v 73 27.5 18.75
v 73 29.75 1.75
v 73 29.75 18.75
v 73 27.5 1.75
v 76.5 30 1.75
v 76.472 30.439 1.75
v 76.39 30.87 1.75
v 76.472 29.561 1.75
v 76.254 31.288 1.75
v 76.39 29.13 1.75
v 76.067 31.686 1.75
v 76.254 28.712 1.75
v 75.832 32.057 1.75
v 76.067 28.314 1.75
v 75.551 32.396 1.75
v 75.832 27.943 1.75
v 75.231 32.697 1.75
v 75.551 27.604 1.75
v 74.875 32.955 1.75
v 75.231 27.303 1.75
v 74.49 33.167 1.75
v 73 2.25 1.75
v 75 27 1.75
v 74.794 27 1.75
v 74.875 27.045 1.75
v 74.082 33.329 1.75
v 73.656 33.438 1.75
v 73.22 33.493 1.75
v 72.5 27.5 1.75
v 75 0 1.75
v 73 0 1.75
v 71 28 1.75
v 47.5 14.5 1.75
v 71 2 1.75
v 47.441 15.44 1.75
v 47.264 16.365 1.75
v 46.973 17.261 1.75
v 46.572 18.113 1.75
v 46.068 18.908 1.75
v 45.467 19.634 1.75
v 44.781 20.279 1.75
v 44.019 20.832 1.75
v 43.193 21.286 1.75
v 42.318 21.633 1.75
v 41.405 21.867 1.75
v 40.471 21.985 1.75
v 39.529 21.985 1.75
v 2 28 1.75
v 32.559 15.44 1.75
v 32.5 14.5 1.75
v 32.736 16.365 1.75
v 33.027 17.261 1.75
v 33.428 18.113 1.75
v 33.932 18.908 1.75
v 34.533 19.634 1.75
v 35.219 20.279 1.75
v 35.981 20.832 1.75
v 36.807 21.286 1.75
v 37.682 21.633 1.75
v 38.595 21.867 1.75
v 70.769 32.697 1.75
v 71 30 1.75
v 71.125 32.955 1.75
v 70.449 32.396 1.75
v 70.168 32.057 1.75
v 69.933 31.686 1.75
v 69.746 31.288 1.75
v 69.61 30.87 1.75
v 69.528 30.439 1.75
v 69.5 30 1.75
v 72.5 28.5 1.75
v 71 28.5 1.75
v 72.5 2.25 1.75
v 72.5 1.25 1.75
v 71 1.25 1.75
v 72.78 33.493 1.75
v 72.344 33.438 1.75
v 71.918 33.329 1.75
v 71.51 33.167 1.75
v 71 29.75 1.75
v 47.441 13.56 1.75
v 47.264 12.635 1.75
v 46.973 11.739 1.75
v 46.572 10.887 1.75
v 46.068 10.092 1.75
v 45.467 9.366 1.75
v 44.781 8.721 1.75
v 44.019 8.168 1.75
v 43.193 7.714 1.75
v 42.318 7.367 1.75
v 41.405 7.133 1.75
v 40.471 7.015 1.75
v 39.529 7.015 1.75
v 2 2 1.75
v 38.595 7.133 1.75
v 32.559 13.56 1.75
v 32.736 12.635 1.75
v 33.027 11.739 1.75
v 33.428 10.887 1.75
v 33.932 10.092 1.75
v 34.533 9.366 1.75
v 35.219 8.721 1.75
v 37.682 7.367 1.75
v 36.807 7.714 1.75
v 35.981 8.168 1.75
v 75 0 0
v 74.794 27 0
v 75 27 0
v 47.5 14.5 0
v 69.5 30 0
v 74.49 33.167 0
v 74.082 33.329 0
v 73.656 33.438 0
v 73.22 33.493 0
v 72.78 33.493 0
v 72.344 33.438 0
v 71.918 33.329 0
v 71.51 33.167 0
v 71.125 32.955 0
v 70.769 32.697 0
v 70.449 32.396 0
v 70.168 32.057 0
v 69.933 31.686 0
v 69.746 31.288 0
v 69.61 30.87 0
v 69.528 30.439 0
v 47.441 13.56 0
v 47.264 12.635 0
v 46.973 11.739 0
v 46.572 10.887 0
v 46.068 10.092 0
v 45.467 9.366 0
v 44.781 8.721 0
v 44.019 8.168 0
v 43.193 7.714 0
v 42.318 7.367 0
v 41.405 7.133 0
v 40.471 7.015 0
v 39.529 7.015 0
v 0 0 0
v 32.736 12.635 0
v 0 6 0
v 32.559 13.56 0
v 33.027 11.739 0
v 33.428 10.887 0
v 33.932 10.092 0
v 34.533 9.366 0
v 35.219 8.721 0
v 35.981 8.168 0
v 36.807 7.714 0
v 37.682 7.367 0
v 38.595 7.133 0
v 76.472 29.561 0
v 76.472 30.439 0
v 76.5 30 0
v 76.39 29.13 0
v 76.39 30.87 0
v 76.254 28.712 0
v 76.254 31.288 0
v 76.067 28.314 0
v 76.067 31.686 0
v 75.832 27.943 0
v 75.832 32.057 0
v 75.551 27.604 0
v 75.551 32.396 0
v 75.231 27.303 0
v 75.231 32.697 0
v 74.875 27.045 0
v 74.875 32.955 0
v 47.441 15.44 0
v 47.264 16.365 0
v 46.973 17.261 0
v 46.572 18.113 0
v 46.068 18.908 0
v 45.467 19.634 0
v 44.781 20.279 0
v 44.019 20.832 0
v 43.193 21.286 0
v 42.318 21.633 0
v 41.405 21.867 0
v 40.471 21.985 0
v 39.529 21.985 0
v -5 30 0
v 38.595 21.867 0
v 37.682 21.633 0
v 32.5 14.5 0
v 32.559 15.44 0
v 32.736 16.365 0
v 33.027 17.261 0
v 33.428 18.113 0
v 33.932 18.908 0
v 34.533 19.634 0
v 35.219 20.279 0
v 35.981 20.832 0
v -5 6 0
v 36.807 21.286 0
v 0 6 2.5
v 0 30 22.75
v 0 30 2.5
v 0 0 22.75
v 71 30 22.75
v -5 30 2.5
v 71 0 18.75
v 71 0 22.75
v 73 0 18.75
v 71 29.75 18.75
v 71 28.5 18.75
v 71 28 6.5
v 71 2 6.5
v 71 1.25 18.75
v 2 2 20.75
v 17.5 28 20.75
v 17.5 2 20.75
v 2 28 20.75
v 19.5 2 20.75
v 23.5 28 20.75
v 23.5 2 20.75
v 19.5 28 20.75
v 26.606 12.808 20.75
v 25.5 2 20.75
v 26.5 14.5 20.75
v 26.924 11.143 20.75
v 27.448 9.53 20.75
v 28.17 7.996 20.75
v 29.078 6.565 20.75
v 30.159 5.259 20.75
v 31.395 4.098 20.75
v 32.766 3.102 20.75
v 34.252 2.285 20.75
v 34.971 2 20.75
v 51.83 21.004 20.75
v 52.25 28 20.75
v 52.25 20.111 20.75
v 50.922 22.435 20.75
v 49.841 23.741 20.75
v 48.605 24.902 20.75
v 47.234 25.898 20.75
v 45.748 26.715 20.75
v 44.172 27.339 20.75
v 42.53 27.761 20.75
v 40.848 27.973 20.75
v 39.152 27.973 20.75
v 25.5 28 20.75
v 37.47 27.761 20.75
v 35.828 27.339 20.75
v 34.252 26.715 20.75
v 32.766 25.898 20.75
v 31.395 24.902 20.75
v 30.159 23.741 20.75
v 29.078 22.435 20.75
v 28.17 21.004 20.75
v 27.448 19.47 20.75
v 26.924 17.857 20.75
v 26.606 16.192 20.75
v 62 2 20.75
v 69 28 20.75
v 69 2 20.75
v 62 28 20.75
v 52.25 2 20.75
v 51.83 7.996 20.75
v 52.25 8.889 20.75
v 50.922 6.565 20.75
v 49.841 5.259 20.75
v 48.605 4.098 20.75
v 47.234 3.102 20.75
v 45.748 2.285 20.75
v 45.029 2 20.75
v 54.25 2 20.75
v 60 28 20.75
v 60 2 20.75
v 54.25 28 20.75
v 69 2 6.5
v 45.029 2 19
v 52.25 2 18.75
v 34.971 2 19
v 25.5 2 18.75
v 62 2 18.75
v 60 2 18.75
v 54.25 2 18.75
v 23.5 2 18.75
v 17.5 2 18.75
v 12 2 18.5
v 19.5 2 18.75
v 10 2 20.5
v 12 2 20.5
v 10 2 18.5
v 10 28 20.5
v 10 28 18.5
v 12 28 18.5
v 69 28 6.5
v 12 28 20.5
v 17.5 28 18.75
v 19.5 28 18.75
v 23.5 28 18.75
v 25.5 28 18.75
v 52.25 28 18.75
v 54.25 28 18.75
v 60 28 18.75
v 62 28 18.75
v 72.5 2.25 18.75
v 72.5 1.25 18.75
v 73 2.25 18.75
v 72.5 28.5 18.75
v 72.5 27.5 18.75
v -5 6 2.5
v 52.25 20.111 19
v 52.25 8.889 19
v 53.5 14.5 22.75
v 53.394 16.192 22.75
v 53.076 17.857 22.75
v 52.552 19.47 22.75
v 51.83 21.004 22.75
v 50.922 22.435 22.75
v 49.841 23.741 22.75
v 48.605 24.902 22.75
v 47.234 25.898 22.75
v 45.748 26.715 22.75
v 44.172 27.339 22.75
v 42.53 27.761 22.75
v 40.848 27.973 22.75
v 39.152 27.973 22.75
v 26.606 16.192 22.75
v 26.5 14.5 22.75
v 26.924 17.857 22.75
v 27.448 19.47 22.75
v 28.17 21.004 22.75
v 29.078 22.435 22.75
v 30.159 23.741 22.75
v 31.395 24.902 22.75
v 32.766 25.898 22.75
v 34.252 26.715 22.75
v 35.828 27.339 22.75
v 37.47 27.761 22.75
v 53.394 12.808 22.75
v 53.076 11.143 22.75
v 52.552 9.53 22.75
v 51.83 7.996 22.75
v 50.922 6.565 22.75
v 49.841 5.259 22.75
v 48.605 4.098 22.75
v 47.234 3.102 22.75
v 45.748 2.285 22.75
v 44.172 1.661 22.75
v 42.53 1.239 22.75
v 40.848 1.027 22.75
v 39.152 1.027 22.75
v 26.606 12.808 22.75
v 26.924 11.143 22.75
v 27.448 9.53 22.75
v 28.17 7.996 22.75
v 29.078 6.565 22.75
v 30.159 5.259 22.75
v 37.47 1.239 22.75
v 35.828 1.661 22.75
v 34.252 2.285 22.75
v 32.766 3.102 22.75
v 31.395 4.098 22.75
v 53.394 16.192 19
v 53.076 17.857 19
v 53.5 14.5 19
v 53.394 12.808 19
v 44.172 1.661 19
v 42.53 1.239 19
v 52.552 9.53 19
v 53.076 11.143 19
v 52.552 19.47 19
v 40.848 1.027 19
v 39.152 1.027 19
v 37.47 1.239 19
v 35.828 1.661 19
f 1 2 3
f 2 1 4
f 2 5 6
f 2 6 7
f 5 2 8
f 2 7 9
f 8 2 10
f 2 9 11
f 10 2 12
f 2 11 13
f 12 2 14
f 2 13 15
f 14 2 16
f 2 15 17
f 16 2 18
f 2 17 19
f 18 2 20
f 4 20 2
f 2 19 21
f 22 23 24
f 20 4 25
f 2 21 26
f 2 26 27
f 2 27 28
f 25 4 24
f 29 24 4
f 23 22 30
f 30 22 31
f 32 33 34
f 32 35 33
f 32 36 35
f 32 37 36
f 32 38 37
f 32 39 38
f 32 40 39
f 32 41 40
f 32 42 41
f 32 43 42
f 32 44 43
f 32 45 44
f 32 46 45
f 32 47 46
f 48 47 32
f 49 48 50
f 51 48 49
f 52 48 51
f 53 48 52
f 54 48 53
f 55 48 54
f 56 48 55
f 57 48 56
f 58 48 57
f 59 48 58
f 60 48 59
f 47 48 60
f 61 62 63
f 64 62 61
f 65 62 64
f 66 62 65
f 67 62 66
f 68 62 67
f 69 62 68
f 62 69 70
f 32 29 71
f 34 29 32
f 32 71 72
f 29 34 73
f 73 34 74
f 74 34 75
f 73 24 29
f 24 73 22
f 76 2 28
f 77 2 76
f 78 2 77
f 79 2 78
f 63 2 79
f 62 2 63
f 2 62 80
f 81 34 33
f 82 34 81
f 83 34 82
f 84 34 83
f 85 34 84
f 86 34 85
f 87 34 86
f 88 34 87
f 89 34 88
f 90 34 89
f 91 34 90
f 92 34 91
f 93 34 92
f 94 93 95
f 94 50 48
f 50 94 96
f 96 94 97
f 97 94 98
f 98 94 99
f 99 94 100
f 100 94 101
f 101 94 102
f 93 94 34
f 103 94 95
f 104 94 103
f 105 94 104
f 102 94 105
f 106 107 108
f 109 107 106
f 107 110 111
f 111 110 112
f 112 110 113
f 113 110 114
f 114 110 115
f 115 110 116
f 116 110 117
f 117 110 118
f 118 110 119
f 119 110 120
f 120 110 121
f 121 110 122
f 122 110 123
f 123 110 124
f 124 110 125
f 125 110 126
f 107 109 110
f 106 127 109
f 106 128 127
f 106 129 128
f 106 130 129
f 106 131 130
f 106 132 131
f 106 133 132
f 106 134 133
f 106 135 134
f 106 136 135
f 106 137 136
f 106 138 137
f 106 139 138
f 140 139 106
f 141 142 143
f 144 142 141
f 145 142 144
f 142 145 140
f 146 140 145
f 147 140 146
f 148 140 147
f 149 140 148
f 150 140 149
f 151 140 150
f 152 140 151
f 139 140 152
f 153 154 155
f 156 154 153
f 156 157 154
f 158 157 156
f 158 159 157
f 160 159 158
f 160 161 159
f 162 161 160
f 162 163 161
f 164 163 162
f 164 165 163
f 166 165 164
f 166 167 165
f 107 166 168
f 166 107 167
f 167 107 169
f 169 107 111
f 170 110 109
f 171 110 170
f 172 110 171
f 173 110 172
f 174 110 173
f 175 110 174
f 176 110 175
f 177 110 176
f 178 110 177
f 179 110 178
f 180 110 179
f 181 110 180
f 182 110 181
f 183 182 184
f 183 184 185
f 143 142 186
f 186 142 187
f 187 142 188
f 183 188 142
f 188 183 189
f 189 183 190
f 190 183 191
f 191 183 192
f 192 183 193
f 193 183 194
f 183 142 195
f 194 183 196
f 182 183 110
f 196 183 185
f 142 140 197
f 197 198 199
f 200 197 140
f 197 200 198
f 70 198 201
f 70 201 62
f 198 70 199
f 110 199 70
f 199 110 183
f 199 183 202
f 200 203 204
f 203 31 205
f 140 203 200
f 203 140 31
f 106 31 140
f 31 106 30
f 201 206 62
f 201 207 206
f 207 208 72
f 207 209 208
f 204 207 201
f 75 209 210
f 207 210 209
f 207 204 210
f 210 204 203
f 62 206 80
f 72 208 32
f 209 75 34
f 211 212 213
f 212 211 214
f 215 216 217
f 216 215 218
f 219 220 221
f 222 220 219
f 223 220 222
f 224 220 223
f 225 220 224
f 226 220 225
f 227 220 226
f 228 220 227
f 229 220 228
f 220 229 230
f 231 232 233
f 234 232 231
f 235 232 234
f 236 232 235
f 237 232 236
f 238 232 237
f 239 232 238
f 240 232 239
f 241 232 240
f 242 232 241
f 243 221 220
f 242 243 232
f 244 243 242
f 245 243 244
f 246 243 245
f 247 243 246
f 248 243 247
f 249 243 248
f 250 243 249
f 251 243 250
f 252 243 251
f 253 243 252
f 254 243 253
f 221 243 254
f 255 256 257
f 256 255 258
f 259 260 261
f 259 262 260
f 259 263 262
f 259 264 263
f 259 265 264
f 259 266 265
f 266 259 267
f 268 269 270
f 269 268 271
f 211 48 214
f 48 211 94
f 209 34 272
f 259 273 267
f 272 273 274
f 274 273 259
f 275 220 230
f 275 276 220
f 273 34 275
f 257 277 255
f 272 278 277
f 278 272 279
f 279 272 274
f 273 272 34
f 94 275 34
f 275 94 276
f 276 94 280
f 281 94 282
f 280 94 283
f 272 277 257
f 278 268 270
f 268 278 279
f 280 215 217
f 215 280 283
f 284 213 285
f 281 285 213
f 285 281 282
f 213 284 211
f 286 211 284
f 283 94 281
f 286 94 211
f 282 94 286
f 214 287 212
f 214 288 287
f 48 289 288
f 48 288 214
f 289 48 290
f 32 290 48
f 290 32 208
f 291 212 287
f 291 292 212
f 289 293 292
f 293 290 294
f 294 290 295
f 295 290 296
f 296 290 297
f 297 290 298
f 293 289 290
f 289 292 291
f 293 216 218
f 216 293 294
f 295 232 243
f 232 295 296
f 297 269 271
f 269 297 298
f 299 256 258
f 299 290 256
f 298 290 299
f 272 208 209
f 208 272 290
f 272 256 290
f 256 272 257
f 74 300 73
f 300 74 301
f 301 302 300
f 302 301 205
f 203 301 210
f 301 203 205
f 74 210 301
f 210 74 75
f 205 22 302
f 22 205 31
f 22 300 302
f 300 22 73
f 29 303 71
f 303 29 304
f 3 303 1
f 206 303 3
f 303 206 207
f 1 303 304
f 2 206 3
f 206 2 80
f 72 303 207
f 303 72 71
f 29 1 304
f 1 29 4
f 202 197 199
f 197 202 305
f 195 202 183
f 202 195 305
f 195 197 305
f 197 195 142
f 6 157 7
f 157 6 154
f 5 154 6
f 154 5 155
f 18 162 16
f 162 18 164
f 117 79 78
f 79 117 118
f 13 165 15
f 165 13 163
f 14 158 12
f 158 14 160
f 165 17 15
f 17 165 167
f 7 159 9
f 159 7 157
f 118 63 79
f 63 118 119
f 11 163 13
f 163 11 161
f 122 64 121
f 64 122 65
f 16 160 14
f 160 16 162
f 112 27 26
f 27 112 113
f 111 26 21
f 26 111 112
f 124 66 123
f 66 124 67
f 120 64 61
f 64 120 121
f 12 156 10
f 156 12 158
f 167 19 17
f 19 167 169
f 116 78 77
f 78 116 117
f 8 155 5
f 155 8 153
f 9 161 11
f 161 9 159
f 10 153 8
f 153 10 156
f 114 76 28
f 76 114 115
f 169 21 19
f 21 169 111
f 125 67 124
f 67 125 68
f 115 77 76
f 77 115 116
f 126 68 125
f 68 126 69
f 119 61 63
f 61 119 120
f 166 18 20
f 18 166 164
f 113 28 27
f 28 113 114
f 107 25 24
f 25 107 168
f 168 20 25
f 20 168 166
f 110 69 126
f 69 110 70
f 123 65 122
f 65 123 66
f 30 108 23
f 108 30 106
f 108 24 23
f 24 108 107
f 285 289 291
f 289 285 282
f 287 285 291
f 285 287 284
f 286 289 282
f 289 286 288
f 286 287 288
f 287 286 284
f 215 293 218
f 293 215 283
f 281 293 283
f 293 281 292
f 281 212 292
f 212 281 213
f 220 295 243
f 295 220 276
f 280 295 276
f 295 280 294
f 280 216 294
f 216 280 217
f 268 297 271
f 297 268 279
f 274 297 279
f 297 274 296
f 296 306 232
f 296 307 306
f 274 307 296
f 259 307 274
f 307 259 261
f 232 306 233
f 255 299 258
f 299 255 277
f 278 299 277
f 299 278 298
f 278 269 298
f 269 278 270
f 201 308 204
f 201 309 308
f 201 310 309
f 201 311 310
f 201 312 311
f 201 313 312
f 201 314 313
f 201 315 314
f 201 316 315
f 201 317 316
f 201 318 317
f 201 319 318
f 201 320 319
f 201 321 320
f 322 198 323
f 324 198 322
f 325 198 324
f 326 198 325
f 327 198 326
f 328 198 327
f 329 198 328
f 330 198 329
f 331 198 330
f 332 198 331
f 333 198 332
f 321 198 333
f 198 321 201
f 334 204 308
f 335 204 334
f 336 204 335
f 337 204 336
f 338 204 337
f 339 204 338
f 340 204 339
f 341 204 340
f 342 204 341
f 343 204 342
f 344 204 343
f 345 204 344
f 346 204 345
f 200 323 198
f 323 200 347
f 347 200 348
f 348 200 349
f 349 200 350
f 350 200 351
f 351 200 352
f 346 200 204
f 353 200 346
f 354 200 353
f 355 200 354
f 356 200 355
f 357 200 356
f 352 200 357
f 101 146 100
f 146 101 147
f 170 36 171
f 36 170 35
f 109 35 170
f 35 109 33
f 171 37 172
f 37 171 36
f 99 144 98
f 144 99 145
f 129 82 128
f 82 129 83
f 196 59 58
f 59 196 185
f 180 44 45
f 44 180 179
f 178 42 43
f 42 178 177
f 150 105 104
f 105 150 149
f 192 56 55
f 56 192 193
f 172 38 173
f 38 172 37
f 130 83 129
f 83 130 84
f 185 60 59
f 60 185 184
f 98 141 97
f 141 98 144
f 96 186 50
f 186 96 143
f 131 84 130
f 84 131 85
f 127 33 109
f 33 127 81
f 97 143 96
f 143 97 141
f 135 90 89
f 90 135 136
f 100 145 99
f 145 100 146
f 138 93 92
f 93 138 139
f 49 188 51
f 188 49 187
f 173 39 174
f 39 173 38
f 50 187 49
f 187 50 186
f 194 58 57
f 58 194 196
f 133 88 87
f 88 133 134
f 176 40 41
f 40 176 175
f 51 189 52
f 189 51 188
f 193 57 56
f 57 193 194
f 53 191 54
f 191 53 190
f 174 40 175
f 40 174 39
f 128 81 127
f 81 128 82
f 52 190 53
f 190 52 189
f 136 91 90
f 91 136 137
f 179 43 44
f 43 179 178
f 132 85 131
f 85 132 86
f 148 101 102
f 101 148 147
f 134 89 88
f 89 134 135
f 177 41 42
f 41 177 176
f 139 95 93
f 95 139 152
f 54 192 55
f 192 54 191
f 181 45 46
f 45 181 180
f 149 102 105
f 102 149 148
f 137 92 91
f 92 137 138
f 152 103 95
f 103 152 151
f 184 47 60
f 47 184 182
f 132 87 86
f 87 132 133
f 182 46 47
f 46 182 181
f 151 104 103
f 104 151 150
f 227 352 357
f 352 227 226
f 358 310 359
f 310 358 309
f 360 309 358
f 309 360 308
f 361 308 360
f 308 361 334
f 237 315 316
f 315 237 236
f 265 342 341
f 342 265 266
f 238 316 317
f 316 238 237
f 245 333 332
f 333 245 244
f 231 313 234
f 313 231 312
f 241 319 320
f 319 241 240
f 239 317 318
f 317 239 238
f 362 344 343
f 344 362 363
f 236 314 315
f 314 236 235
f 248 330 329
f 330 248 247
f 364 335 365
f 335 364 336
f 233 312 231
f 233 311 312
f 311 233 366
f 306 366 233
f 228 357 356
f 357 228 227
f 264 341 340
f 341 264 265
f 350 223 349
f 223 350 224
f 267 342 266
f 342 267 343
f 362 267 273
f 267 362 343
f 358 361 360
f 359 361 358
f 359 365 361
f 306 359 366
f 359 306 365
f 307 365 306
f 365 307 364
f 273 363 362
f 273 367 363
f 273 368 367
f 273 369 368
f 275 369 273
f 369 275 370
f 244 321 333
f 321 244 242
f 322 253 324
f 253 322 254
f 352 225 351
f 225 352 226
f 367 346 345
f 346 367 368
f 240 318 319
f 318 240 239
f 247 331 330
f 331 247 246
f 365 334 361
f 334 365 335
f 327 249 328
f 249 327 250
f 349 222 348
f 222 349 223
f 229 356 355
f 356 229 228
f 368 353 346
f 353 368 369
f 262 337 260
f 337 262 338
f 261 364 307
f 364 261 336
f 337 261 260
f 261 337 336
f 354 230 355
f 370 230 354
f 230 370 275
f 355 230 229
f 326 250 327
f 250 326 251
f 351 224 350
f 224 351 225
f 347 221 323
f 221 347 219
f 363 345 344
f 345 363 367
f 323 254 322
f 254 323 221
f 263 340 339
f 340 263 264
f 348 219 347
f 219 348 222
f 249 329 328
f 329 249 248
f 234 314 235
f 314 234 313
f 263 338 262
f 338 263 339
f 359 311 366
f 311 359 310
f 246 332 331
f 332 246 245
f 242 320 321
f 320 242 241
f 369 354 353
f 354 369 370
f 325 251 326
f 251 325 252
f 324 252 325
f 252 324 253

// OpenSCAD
// Gimme Shelter Box
difference() {
    union() {
        // GSB Base
        cube([73,30,1.75]);
        
        // GSB Sides
        translate([2, 0, 1.75]) {
            color([1,0,0])
            cube([69,2,19]);
        }
        translate([2, 28, 1.75]) {
            color([0,0,1])
            cube([69,2,19]);
        }
       // GSB Rear
       translate([0, 0, 1.75]) {
             color([0,1,0])
             cube([2,30,19]);
       }
       
       // GSB Front
       translate([69, 2, 6.5]) {
             color([1,1,1])
             cube([2,26,14.25]);
       }
       
       // Door Slide Left
         translate([71, 0, 1.5]) {
             color([0,.75,.5])
             cube([1.5,1.25,17.25]);
       }
        translate([72.5, 0, 1.5]) {
             color([.6,.75,.5])
             cube([.5,2.25,17.25]);
       }
       
        // Door Slide Right
         translate([71, 28.5, 1.5]) {
             color([0,.75,.5])
             cube([1.5,1.25,17.25]);
       }
        translate([72.5, 27.5, 1.5]) {
             color([.6,.75,.5])
             cube([.5,2.25,17.25]);
       }
       
       // Left caliper hard point
       translate([-5,6,0]) {
           color([1,0,1])
           cube([5,24,2.5]);
       }
       
       // Right caliper hard point circle
       translate([73,30,0]) {
           color([0,1,1])
           cylinder(h=1.75, d=7, $fn=50);
       }
       
       // Right caliper hard point rectangle
       translate([73,0,0]) {
           color([1,1,0])
           cube([2,27,1.75]);
       }
       // GSB Top Supports
       translate([10, 1.5, 18.5]) {
             color([0,1,1])
             cube([2,27,2]);
       }
       
       translate([17.5, 1.5, 18.75]) {
             color([0,1,1])
             cube([2,27,2]);
       }
       translate([23.5, 1.5, 18.75]) {
             color([0,1,1])
             cube([2,27,2]);
       }
       translate([52.25, 1.5, 18.75]) {
             color([0,1,1])
             cube([2,27,2]);
       }
       translate([60, 1.5, 18.75]) {
             color([0,1,1])
             cube([2,27,2]);
       }
      
       // GSB Top
       translate([0,0,20.75]) {
        color([1,.5,.5])
        cube([71,30,2]);
       }
    }
    
    // Slide Well
    translate([40,14.5,-1]) cylinder(h=8, d=15,
    $fn=50);
    
    // Objective Hole
     // Slide Well
    translate([40,14.5,19]) cylinder(h=8, d=27,
    $fn=50);
}
